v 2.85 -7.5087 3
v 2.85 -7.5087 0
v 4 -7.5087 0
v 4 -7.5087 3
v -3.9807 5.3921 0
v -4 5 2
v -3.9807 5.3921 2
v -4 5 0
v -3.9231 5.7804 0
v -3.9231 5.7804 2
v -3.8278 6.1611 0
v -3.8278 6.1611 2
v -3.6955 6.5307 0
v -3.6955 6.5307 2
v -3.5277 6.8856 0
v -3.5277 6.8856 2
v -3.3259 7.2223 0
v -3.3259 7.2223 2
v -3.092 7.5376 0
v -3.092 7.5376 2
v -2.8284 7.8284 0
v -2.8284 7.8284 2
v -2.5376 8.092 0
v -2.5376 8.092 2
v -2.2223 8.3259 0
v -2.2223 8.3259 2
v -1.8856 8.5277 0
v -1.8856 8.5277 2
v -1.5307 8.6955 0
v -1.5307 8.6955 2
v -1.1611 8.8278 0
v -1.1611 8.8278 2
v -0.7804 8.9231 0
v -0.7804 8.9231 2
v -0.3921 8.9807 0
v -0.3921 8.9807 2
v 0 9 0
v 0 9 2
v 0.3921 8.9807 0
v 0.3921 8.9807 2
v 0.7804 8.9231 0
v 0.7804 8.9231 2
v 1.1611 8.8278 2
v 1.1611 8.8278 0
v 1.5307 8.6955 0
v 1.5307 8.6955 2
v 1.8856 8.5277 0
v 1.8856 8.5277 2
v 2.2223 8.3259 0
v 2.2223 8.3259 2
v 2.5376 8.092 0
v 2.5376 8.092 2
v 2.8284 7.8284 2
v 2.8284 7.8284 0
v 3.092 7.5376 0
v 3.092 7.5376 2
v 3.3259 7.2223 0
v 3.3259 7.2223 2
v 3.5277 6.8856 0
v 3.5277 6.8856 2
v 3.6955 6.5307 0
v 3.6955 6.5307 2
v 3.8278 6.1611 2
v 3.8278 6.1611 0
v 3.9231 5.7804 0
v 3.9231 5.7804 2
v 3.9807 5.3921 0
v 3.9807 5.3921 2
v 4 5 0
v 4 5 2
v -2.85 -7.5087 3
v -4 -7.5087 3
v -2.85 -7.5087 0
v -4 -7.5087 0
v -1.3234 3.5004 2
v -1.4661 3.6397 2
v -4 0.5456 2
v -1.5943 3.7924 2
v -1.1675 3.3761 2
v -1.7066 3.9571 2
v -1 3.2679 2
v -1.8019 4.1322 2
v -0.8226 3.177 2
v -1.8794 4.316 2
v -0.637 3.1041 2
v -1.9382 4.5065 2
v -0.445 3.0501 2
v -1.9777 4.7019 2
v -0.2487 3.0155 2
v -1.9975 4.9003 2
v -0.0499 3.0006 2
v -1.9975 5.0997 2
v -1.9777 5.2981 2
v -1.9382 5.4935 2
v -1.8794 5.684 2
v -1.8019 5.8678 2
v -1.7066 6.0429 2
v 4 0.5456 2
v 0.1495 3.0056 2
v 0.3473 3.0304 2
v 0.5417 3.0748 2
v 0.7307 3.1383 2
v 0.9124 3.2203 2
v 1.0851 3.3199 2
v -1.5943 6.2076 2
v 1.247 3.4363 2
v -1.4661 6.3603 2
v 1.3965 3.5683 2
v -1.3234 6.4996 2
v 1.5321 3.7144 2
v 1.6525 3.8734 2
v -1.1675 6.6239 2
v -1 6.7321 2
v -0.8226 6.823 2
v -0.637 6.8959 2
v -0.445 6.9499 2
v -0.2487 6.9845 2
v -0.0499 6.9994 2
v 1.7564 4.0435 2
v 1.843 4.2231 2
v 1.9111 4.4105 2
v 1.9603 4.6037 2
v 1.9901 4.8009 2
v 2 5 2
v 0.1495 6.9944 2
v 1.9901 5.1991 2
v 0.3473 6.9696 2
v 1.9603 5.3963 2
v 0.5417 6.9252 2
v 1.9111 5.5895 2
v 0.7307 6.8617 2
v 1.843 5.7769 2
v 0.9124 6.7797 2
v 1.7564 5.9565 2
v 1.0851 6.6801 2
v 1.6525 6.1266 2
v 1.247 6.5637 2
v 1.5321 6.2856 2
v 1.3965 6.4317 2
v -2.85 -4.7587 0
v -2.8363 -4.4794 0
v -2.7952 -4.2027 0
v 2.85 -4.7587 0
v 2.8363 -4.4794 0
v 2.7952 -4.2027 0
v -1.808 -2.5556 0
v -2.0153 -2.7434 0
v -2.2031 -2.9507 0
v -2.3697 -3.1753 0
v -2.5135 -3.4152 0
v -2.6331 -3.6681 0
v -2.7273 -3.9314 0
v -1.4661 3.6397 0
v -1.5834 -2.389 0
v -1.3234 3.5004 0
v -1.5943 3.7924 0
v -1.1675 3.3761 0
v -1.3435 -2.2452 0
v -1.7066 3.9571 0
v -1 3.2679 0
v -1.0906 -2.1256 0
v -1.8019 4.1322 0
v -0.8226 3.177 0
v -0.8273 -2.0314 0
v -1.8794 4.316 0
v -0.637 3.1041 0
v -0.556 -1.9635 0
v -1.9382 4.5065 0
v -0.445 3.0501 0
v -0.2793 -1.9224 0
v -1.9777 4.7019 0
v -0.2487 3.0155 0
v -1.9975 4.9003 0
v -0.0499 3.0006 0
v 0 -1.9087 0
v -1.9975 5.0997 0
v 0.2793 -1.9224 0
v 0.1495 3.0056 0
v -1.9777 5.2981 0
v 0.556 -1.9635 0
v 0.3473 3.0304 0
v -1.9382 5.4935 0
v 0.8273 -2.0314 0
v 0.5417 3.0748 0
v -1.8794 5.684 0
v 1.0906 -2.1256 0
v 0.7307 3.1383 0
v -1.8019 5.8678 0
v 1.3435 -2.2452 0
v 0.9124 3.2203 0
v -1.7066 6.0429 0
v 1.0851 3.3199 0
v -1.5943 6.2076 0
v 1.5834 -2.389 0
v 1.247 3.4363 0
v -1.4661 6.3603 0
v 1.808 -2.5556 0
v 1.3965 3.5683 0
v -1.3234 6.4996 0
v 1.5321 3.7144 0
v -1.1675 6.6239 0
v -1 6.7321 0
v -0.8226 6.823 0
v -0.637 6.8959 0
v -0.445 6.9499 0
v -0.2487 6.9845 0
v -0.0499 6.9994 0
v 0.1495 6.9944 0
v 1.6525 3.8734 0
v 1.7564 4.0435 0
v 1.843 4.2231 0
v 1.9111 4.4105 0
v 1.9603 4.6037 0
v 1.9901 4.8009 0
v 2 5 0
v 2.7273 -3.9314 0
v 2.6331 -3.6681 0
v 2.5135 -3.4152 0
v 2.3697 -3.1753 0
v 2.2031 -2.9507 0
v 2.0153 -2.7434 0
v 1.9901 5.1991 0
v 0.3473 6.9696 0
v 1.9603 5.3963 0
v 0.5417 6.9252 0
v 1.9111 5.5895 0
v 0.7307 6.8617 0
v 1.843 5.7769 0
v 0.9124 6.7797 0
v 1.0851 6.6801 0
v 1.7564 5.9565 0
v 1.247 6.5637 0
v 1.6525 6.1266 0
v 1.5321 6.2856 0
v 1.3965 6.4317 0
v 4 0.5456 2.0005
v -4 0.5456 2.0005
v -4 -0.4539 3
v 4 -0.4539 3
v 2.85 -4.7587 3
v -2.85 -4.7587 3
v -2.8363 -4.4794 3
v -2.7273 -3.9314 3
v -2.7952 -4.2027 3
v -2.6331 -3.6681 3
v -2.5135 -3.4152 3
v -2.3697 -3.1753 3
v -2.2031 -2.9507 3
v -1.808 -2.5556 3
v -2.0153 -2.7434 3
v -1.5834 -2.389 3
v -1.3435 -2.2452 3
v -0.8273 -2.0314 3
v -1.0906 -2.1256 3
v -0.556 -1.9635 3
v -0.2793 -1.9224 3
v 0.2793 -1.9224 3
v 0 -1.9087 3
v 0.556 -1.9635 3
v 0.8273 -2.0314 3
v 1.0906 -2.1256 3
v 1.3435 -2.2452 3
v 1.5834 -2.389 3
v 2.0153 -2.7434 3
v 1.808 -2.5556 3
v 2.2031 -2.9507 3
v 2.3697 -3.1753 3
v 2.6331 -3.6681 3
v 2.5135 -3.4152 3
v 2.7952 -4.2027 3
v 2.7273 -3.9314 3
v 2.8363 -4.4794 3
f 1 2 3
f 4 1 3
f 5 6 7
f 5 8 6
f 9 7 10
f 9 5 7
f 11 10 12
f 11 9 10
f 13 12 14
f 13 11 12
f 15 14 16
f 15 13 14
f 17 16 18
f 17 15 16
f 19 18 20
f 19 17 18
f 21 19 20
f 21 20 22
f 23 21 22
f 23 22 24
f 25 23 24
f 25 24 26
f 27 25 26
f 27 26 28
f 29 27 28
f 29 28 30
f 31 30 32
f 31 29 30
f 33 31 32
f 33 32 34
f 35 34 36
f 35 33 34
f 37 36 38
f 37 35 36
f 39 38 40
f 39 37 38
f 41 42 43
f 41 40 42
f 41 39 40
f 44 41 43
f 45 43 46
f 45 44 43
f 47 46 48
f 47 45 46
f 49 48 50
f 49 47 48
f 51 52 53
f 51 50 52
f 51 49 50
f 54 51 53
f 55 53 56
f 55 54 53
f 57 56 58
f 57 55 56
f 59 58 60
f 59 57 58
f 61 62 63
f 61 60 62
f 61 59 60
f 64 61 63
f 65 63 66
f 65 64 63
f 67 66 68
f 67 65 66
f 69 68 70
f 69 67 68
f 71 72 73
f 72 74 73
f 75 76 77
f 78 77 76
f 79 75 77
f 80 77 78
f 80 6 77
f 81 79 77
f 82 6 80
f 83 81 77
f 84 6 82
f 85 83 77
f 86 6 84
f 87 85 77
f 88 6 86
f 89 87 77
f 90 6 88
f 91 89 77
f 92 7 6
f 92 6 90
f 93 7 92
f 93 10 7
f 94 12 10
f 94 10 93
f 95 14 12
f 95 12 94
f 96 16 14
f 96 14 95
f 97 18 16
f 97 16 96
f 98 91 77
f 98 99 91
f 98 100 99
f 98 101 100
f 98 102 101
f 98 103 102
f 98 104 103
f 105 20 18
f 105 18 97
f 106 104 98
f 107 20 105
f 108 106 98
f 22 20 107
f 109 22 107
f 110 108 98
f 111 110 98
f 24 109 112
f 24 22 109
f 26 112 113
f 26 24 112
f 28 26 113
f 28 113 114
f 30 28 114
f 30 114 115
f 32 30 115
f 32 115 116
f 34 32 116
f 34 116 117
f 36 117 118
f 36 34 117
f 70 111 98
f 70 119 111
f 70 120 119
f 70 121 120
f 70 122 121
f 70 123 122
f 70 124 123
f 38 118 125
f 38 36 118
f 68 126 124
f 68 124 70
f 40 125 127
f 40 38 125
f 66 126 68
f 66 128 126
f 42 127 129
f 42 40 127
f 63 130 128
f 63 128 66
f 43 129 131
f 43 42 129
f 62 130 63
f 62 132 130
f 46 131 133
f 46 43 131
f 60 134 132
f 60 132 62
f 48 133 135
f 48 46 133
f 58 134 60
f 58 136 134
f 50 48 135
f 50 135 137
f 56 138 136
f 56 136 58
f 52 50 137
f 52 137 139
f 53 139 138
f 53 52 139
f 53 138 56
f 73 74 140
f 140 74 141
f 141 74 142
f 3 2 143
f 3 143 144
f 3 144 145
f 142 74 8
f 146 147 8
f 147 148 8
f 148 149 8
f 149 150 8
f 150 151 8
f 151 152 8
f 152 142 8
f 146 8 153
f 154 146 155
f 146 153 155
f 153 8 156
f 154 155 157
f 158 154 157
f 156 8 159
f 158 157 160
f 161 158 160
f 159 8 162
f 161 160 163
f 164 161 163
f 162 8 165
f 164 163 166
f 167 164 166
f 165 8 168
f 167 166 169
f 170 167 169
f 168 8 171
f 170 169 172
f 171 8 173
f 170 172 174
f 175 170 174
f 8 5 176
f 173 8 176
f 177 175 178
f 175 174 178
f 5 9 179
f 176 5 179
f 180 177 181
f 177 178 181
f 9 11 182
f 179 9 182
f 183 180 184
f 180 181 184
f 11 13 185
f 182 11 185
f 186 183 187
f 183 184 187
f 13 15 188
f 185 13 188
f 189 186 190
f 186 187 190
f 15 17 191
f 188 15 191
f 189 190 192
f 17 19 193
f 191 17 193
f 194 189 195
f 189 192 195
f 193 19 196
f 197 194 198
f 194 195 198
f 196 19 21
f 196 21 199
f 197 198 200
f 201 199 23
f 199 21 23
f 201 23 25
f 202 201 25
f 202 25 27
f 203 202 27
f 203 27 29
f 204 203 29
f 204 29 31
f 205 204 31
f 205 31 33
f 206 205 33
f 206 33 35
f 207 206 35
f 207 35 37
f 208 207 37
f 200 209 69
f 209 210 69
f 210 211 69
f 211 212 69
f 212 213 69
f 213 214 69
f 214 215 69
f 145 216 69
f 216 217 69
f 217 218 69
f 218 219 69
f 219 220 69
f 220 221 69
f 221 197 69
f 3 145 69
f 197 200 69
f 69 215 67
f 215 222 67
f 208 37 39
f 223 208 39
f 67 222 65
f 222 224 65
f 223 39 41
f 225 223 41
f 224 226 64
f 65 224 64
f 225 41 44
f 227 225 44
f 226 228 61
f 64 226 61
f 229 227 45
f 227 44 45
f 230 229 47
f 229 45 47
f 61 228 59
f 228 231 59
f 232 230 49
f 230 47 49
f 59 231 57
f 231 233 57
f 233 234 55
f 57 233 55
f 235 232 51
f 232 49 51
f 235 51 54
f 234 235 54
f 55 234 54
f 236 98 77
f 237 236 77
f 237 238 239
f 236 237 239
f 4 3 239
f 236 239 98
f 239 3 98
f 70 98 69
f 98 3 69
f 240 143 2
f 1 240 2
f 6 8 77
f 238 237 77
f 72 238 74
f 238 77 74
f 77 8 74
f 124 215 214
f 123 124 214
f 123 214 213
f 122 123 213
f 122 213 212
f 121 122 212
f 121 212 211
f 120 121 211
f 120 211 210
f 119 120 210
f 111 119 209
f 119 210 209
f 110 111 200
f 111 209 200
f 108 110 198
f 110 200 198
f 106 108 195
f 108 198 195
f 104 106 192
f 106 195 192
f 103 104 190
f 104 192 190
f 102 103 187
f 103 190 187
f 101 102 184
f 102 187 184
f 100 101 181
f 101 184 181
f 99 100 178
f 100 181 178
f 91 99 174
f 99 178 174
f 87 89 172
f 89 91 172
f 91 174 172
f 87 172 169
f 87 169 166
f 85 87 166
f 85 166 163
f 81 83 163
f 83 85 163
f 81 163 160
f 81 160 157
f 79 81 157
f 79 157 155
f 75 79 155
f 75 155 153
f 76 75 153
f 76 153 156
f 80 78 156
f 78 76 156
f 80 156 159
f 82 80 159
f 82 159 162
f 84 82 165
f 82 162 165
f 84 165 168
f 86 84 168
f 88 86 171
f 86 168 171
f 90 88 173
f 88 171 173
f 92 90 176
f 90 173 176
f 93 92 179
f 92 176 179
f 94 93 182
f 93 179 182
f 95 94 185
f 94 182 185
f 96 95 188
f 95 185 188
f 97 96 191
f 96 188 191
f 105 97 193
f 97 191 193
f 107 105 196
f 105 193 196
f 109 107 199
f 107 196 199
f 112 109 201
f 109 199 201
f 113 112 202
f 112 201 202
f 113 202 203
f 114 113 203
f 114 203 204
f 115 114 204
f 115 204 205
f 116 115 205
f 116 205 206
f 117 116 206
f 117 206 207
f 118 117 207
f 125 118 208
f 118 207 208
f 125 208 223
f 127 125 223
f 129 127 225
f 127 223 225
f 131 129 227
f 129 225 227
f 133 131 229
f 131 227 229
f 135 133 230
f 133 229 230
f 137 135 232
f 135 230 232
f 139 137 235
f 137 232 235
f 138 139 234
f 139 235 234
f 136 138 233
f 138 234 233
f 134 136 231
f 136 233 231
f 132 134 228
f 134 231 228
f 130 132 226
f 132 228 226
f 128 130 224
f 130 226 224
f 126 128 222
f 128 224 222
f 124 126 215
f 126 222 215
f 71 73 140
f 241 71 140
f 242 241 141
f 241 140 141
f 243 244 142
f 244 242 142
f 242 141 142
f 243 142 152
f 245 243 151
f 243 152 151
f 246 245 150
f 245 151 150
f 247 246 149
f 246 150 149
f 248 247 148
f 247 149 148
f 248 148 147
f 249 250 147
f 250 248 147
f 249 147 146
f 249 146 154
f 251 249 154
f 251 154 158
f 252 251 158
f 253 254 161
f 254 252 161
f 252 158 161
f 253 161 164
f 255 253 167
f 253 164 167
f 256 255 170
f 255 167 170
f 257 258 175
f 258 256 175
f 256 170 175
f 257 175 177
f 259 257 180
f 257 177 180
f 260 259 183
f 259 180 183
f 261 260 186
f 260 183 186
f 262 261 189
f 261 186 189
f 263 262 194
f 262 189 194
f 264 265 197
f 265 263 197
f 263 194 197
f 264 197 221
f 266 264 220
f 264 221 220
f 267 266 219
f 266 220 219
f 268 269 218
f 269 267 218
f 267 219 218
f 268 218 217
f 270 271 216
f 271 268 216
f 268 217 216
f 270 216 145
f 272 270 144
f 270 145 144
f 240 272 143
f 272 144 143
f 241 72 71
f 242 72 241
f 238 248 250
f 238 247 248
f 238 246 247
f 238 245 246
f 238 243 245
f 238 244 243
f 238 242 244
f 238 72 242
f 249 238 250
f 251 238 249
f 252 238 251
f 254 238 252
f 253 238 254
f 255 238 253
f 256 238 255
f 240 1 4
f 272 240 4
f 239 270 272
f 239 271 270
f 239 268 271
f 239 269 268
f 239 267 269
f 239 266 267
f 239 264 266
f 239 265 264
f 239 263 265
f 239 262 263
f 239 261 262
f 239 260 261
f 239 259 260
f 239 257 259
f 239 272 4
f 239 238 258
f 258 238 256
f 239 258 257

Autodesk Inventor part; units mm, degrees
ref_plane "YZ Plane" through (0, 0, 0) normal (1, 0, 0) x (0, 1, 0)
ref_plane "XZ Plane" through (0, 0, 0) normal (0, 1, 0) x (-1, 0, 0)
ref_plane "XY Plane" through (0, 0, 0) normal (0, 0, 1) x (1, 0, 0)
sketch "Sketch1" plane through (0, 0, 0) normal (0, 0, 1) x (1, 0, 0)
  circle A0 centre (0, 5) radius 1.5 construction
  circle A1 centre (0, -4.7587) radius 2.75 construction
  circle A2 centre (0, 5) radius 4
  line L0 (4, -7.5087) -> (-4, -7.5087)
  line L1 (-4, -7.5087) -> (-4, 5)
  line L2 (4, -7.5087) -> (4, 5)
  circle A3 centre (0, -4.7587) radius 2.85
  line L3 (2.85, -4.7587) -> (2.85, -7.5087)
  line L4 (-2.85, -4.7587) -> (-2.85, -7.5087)
  circle A4 centre (0, 5) radius 2
  point P0 (0, 0)
  dimension "d0" = 8
  dimension "d1" = 0.1
  dimension "d2" = 4
extrude "Extrusion1" add sketch "Sketch1" along normal blind 2 contours A2 | L2 L0 L3 A3 L4 L1 A2
sketch "Sketch3" plane through (0, 0, 2) normal (0, 0, 1) x (1, 0, 0)
  line L0 (-4, 5) -> (-4, -7.5087) projected
  line L1 (-4, -7.5087) -> (-2.85, -7.5087) projected
  line L2 (-2.85, -7.5087) -> (-2.85, -4.7587) projected
  arc A0 (2.85, -4.7587) -> (-2.85, -4.7587) centre (0, -4.7587) ccw projected
  line L3 (2.85, -4.7587) -> (2.85, -7.5087) projected
  line L4 (2.85, -7.5087) -> (4, -7.5087) projected
  line L5 (4, -7.5087) -> (4, 5) projected
  arc A1 (4, 5) -> (-4, 5) centre (0, 5) ccw projected
  circle A2 centre (0, 5) radius 2 projected
  circle A3 centre (0, 5) radius 2 construction
  line L6 (0, 3) -> (0, -1.9087) construction
  line L7 (4, -7.5087) -> (4, 5) projected
  line L8 (4, 0.5456) -> (-4, 0.5456)
  arc A4 (2.85, -4.7587) -> (-2.85, -4.7587) centre (0, -4.7587) ccw projected
  point P0 (0, 0)
  point P1 (0, 0.5456)
  point P2 (0, -1.9087)
extrude "Extrusion2" add sketch "Sketch3" along normal blind 1 contours L8 L5 L4 L3 A0 L2 L1 L0
chamfer "Chamfer1" distance 1 angle 45 1 edges at (0, 0.5456, 3)
properties part number "display-retainer-tab"
